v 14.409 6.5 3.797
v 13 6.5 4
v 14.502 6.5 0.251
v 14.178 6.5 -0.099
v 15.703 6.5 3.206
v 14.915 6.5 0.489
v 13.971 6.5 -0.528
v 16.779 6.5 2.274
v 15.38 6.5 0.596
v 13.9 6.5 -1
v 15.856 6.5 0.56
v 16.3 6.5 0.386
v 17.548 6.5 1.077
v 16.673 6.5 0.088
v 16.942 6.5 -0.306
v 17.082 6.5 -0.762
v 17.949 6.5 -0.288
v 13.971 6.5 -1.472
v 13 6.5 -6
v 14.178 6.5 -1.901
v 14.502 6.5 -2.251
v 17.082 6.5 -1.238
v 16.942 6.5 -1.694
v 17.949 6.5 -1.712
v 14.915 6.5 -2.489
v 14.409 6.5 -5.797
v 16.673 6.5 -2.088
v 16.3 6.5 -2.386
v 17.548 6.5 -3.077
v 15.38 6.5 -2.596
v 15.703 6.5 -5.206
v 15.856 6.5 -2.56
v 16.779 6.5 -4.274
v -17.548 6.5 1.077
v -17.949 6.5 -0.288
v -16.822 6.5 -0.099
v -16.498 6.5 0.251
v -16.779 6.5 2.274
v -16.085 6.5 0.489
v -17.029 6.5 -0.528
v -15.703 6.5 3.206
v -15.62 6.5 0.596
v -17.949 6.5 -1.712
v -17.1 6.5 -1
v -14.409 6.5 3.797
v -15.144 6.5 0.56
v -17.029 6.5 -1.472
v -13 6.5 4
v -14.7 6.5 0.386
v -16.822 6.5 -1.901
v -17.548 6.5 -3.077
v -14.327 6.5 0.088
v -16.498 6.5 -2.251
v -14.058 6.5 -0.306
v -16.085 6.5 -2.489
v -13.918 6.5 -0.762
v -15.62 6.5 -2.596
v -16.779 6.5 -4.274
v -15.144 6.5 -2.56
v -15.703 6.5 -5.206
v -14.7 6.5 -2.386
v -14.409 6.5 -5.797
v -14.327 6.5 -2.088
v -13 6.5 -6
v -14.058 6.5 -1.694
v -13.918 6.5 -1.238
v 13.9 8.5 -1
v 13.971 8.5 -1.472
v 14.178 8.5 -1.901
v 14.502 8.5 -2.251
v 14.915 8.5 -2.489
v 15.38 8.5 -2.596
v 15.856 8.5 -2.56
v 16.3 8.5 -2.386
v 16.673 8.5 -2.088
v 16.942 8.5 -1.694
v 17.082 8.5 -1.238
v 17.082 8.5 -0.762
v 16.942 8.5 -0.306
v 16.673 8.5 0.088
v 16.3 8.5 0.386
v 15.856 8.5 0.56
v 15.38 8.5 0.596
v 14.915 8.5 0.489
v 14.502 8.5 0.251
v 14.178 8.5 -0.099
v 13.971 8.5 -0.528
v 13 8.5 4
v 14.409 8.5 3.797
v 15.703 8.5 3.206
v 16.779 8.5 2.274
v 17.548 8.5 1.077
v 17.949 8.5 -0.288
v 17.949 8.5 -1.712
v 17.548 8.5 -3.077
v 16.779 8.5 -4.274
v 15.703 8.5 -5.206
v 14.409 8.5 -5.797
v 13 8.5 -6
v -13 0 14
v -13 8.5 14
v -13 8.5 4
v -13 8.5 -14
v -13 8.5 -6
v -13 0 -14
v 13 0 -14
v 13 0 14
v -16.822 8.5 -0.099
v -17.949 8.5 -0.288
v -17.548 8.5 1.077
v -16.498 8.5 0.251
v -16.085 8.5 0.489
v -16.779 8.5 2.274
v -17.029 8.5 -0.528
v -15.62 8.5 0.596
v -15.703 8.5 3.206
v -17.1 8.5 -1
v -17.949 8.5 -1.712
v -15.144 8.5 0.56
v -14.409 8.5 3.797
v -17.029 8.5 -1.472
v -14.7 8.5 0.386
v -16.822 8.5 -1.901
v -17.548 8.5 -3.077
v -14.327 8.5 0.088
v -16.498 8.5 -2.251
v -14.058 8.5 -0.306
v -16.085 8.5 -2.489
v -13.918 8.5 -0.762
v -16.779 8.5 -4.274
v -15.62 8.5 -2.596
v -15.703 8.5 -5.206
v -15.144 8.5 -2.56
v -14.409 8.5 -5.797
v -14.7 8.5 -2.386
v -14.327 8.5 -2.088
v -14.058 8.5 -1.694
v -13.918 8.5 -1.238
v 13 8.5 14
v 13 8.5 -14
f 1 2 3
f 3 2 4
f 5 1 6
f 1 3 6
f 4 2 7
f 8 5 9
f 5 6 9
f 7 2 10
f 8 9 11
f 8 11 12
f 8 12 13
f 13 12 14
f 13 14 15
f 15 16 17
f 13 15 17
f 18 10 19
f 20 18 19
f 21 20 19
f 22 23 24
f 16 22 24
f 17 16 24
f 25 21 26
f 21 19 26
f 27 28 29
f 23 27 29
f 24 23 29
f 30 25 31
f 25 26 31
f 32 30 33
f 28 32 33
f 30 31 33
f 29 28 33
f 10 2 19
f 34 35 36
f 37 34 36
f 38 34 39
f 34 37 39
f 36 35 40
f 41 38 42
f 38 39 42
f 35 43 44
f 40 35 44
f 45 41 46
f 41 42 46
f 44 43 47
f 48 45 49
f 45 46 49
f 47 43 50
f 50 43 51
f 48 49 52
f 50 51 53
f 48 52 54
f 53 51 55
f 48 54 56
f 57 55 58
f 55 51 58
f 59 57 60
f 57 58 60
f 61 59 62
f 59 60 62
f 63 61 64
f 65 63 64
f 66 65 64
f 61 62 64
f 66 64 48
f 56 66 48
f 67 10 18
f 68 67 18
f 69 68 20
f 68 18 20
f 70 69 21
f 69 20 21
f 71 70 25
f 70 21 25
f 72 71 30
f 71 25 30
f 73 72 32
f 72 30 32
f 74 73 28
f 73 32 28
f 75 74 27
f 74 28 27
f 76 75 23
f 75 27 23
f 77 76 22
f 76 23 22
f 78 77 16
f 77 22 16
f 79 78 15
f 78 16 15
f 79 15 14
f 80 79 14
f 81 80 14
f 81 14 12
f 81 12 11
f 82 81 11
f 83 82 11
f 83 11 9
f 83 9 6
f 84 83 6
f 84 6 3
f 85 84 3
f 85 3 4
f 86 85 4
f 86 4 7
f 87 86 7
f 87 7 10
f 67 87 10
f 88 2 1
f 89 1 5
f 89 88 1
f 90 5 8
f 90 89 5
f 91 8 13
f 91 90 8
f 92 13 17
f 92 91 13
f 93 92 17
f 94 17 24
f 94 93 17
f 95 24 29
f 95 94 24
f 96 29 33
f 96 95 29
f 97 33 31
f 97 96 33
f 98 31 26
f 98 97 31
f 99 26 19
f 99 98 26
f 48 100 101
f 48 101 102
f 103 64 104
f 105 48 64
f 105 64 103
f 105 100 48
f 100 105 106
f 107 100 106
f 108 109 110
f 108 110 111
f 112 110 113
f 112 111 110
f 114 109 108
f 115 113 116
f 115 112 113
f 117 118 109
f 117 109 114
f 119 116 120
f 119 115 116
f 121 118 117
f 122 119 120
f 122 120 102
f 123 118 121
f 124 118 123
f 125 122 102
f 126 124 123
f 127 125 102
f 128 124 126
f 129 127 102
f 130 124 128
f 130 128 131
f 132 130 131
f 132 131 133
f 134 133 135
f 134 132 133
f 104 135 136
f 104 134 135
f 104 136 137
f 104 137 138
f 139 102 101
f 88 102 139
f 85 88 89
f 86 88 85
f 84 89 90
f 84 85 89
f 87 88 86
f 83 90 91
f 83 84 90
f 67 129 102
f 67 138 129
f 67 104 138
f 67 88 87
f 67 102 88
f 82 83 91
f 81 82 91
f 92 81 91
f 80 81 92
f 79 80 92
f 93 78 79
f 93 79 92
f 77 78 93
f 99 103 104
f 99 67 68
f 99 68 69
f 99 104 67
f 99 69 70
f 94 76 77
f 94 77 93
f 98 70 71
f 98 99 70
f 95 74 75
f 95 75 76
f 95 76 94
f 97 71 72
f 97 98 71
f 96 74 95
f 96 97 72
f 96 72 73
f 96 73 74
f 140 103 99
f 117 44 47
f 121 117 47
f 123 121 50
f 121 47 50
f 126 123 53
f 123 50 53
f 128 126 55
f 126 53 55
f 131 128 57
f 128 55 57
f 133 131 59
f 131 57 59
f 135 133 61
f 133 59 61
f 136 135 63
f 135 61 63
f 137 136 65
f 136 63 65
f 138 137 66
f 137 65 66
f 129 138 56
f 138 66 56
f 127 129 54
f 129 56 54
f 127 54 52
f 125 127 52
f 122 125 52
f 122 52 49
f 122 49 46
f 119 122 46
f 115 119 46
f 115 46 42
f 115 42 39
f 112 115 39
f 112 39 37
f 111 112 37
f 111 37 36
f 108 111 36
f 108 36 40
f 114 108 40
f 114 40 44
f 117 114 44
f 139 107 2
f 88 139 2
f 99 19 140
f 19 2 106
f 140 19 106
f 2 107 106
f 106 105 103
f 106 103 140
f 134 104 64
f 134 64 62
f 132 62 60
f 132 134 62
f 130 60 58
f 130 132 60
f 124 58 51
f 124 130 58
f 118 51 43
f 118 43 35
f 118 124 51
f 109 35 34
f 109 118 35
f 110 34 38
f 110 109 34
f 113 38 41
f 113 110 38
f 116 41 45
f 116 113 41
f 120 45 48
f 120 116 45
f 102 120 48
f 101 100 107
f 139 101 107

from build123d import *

# Parameters (mm, degrees)
SKETCH1_W            = 26
SKETCH1_H            = 28
BOSS_EXTRUDE1_DEPTH  = 8.5
SKETCH2_R            = 5
BOSS_EXTRUDE2_DEPTH  = 2
M3_CLEARANCE_HOLE1_D = 3.2


with BuildPart() as part:
    # Sketch1 → Boss-Extrude1 (new body)
    with BuildSketch(Plane(origin=(0, 0, 0), x_dir=(1, 0, 0), z_dir=(0, 1, 0))):
        Rectangle(SKETCH1_W, SKETCH1_H)
    extrude(amount=BOSS_EXTRUDE1_DEPTH)

    # Sketch2 → Boss-Extrude2 (add)
    with BuildSketch(Plane(origin=(0, 8.5, 0), x_dir=(1, 0, 0), z_dir=(0, 1, 0))):
        with Locations((-13, 1)):
            Circle(SKETCH2_R)
        with Locations((13, 1)):
            Circle(SKETCH2_R)
    extrude(amount=-BOSS_EXTRUDE2_DEPTH)

    # M3 Clearance Hole1 (through all)
    with Locations(Plane(origin=(0, 8.5, 0), x_dir=(1, 0, 0), z_dir=(0, 1, 0))):
        with Locations((-15.5, 1), (15.5, 1)):
            Hole(M3_CLEARANCE_HOLE1_D / 2)


solid = part.part
